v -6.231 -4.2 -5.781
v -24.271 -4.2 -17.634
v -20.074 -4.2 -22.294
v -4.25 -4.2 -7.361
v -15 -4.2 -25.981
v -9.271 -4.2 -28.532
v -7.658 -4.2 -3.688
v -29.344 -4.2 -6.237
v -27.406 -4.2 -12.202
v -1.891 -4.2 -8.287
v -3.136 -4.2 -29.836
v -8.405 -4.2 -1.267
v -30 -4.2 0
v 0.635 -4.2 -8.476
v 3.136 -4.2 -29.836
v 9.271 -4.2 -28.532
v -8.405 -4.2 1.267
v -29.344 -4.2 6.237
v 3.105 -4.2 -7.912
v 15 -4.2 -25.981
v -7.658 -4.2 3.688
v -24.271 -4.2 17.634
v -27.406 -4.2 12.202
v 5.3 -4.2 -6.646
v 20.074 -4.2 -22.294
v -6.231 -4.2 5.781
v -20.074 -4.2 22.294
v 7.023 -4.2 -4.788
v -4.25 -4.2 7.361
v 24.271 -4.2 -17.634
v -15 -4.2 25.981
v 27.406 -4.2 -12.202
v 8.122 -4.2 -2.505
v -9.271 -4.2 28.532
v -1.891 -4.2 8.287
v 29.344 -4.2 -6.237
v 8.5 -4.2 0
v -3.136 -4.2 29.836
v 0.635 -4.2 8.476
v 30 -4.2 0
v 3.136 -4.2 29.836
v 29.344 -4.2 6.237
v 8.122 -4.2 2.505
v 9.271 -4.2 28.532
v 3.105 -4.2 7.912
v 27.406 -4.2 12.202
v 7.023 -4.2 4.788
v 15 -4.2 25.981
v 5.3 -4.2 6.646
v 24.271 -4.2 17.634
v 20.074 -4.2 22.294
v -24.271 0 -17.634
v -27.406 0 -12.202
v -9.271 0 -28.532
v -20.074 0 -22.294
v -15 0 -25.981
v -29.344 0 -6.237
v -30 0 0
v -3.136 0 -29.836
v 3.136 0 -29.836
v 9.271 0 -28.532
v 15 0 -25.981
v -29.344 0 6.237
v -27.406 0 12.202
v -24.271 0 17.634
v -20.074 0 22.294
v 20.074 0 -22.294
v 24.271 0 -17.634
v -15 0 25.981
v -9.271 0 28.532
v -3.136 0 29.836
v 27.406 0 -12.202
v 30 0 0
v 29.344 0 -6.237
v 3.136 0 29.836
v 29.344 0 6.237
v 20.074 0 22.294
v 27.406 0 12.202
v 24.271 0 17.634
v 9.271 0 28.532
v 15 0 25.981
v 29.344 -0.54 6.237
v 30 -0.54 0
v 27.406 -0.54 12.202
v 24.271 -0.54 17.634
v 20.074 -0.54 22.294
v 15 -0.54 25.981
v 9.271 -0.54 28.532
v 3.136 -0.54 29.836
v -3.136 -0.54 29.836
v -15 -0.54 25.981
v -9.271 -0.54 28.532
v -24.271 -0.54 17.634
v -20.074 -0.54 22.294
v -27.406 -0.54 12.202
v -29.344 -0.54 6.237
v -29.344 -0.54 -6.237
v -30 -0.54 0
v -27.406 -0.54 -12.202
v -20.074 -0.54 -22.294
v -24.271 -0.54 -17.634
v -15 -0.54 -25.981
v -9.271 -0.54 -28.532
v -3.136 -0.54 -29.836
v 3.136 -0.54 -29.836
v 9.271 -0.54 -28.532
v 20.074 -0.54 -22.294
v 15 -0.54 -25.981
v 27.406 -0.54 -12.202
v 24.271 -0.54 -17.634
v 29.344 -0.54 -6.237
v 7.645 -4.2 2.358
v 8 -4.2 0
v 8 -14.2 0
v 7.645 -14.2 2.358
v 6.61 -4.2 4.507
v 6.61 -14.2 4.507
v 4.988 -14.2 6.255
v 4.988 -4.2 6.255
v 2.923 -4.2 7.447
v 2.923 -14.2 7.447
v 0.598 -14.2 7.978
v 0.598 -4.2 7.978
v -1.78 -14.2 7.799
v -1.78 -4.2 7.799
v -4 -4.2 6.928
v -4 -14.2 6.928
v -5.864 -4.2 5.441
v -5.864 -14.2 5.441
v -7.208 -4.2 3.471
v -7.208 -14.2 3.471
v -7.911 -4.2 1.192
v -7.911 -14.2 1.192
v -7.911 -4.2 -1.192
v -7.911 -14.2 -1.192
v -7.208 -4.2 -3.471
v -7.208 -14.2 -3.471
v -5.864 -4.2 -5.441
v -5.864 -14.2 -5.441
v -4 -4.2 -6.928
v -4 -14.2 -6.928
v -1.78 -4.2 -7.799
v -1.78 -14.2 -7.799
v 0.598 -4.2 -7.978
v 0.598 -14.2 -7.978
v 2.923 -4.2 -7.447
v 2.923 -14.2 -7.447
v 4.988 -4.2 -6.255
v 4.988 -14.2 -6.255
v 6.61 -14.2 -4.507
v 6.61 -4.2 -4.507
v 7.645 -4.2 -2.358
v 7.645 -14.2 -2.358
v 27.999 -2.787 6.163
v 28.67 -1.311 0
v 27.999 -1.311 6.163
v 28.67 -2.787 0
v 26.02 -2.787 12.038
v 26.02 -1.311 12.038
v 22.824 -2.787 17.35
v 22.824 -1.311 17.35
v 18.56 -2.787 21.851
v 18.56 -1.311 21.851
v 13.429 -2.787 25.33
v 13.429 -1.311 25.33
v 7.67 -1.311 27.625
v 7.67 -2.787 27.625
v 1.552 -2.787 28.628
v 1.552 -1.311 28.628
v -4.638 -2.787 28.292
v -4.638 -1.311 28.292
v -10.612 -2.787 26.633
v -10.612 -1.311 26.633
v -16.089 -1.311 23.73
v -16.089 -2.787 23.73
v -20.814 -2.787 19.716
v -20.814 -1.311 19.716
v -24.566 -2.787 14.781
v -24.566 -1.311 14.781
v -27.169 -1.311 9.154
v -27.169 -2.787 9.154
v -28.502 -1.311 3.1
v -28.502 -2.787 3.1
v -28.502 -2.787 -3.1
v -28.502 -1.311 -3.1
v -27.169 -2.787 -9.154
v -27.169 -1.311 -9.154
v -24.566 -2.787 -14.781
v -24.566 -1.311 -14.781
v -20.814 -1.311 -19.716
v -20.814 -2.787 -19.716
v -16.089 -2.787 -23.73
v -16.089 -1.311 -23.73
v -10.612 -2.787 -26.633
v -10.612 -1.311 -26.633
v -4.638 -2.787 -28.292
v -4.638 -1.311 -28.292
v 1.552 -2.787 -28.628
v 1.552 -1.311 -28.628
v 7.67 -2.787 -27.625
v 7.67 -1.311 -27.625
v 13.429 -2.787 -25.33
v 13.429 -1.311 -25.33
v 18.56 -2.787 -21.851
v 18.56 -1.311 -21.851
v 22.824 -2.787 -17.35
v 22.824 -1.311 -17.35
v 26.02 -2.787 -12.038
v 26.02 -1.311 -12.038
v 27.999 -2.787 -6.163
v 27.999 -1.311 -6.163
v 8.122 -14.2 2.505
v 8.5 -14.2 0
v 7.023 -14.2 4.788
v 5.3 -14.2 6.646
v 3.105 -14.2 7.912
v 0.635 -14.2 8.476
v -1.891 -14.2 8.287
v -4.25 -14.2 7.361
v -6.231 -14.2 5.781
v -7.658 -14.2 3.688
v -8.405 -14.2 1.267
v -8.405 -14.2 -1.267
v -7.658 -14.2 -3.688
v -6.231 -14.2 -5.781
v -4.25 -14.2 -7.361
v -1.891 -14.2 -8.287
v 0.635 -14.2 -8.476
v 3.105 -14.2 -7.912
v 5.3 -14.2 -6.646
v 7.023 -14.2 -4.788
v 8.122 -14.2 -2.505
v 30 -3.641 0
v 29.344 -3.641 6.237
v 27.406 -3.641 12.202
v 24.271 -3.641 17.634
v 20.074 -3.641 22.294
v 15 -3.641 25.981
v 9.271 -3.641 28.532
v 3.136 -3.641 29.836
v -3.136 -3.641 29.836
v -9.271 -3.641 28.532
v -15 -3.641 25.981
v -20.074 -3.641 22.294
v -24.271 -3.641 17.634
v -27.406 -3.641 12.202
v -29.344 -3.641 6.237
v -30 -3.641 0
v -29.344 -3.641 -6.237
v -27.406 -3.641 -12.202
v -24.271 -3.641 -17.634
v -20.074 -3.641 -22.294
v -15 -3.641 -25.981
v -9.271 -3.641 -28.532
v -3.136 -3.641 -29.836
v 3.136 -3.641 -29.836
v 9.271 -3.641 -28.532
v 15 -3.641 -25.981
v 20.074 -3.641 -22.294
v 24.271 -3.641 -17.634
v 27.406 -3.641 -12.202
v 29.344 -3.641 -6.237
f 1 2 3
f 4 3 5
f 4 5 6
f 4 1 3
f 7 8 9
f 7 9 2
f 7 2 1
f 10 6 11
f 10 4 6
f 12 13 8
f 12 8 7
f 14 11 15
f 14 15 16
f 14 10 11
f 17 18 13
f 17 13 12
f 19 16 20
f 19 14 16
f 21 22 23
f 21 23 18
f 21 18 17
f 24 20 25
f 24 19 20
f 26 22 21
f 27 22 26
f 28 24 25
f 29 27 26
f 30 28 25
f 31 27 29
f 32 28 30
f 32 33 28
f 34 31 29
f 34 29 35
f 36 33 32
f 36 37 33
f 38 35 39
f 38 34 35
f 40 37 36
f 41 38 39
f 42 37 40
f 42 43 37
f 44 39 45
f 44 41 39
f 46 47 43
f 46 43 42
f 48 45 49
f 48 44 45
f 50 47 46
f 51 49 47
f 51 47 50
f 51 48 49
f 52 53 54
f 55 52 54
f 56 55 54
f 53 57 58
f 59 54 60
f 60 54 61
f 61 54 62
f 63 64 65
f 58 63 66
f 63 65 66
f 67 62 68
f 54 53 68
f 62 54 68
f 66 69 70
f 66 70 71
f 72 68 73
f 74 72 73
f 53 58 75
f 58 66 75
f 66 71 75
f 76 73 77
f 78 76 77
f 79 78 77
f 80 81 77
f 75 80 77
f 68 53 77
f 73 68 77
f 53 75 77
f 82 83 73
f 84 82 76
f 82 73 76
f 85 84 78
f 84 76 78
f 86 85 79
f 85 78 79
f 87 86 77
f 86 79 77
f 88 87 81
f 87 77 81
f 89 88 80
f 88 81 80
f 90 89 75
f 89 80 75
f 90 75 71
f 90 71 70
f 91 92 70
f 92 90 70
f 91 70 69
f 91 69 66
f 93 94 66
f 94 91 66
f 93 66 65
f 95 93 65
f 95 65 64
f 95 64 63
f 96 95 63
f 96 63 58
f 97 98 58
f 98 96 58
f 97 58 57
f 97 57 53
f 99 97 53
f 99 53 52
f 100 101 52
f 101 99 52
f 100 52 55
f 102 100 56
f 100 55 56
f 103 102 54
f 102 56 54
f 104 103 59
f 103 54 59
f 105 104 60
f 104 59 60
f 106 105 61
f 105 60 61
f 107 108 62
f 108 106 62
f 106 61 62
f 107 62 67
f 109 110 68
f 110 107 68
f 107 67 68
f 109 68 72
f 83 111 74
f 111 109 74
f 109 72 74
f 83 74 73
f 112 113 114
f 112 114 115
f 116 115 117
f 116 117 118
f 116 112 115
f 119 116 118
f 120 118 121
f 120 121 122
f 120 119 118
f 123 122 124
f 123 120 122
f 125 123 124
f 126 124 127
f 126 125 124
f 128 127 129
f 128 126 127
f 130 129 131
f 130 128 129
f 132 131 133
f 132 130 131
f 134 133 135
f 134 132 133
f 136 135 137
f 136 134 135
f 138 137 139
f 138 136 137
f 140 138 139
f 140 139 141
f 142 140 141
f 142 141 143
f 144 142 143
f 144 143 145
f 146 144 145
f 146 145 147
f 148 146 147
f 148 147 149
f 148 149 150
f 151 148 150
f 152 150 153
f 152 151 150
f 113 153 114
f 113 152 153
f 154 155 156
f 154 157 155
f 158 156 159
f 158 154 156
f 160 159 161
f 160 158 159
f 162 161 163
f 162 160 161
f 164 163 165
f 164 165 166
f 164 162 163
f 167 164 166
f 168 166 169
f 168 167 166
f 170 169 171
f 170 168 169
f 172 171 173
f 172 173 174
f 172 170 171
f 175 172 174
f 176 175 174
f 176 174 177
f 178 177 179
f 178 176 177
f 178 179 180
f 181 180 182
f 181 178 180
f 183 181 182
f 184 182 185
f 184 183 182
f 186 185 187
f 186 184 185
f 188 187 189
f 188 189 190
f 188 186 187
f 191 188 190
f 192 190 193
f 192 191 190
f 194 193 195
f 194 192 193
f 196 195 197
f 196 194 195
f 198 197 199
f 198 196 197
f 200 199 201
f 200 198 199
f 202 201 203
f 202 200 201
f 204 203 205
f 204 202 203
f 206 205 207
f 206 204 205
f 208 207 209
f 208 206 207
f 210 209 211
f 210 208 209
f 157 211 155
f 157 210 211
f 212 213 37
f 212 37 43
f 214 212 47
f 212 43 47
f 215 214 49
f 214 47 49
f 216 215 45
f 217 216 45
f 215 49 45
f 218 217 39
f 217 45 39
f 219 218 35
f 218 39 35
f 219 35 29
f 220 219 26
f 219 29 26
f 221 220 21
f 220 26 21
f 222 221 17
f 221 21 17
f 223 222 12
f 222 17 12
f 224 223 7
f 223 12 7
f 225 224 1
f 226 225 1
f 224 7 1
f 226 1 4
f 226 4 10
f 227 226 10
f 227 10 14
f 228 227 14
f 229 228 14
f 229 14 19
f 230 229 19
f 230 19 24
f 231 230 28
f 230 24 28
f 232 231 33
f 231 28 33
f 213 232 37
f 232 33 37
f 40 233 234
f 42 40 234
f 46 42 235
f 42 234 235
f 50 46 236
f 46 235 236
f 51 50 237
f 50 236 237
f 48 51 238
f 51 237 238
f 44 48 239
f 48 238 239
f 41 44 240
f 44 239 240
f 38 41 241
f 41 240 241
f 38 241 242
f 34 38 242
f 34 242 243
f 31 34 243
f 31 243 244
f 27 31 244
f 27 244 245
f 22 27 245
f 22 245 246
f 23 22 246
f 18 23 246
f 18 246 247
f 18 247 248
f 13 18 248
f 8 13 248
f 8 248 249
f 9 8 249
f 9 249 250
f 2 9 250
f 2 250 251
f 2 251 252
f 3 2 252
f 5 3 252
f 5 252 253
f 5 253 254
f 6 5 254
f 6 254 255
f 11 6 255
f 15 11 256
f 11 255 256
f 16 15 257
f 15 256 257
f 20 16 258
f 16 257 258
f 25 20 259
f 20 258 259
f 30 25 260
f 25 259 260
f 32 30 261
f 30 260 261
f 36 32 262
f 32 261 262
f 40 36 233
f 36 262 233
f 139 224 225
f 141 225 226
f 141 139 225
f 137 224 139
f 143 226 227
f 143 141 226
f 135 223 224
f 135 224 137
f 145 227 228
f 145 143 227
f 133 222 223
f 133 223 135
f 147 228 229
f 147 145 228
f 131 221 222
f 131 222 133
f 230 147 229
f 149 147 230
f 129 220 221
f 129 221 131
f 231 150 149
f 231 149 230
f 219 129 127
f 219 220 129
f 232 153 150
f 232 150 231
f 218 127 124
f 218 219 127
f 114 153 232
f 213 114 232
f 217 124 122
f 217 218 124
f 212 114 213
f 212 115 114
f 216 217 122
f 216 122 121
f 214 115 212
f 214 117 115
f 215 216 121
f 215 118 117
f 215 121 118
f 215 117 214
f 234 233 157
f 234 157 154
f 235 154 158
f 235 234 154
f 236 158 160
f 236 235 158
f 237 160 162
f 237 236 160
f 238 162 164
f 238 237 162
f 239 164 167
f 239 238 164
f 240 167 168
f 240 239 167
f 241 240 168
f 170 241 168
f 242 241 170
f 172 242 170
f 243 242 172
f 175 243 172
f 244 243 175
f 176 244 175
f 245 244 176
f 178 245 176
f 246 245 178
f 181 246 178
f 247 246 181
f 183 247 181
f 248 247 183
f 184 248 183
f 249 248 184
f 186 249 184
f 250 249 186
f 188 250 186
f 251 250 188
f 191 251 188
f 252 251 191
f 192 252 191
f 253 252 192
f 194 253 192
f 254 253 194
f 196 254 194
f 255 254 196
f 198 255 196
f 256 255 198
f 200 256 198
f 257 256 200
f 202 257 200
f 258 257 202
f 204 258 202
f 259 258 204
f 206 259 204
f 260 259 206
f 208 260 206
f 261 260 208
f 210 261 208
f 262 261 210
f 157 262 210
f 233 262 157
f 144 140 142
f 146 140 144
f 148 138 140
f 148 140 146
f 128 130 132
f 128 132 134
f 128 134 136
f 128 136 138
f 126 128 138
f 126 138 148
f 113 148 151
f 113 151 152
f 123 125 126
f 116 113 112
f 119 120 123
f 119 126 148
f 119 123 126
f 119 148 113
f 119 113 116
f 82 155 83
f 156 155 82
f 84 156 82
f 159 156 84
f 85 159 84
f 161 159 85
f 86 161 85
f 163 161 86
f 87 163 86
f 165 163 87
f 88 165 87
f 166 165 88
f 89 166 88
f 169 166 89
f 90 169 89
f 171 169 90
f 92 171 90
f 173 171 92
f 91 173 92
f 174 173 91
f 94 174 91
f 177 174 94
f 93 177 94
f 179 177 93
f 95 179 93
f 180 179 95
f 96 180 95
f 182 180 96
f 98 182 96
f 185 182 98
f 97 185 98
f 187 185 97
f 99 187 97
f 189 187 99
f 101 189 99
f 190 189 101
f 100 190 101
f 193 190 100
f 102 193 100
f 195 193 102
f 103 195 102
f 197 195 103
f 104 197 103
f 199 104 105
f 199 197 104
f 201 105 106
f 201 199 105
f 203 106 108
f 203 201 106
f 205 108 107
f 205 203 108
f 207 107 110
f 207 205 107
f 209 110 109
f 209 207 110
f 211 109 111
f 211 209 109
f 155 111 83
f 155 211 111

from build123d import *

# Parameters (mm, degrees)
F0_R     = 30
F1_DEPTH = 4.2
F2_R     = 8.5
F2_R_2   = 8
F3_DEPTH = 10


with BuildPart() as f1:
    # F0 (on Front) → F1 (new body)
    with BuildSketch(Plane.XZ):
        Circle(F0_R)
    extrude(amount=F1_DEPTH)

    # F2 (on face) → F3 (join)
    with BuildSketch(Plane.XZ.offset(4.2)):
        Circle(F2_R)
        Circle(F2_R_2, mode=Mode.SUBTRACT)
    extrude(amount=F3_DEPTH)

    # F4 (on Top) → F5 (revolve, cut)
    with BuildSketch(Plane.XY):
        Polygon((28.669611, -2.787452), (30.564366, -4.003254), (30.564366, -0.213743), (28.669611, -1.310707), align=None)
    revolve(axis=Axis((0, -2.633361, 0), (0, -1, 0)), mode=Mode.SUBTRACT)


solid = f1.part
